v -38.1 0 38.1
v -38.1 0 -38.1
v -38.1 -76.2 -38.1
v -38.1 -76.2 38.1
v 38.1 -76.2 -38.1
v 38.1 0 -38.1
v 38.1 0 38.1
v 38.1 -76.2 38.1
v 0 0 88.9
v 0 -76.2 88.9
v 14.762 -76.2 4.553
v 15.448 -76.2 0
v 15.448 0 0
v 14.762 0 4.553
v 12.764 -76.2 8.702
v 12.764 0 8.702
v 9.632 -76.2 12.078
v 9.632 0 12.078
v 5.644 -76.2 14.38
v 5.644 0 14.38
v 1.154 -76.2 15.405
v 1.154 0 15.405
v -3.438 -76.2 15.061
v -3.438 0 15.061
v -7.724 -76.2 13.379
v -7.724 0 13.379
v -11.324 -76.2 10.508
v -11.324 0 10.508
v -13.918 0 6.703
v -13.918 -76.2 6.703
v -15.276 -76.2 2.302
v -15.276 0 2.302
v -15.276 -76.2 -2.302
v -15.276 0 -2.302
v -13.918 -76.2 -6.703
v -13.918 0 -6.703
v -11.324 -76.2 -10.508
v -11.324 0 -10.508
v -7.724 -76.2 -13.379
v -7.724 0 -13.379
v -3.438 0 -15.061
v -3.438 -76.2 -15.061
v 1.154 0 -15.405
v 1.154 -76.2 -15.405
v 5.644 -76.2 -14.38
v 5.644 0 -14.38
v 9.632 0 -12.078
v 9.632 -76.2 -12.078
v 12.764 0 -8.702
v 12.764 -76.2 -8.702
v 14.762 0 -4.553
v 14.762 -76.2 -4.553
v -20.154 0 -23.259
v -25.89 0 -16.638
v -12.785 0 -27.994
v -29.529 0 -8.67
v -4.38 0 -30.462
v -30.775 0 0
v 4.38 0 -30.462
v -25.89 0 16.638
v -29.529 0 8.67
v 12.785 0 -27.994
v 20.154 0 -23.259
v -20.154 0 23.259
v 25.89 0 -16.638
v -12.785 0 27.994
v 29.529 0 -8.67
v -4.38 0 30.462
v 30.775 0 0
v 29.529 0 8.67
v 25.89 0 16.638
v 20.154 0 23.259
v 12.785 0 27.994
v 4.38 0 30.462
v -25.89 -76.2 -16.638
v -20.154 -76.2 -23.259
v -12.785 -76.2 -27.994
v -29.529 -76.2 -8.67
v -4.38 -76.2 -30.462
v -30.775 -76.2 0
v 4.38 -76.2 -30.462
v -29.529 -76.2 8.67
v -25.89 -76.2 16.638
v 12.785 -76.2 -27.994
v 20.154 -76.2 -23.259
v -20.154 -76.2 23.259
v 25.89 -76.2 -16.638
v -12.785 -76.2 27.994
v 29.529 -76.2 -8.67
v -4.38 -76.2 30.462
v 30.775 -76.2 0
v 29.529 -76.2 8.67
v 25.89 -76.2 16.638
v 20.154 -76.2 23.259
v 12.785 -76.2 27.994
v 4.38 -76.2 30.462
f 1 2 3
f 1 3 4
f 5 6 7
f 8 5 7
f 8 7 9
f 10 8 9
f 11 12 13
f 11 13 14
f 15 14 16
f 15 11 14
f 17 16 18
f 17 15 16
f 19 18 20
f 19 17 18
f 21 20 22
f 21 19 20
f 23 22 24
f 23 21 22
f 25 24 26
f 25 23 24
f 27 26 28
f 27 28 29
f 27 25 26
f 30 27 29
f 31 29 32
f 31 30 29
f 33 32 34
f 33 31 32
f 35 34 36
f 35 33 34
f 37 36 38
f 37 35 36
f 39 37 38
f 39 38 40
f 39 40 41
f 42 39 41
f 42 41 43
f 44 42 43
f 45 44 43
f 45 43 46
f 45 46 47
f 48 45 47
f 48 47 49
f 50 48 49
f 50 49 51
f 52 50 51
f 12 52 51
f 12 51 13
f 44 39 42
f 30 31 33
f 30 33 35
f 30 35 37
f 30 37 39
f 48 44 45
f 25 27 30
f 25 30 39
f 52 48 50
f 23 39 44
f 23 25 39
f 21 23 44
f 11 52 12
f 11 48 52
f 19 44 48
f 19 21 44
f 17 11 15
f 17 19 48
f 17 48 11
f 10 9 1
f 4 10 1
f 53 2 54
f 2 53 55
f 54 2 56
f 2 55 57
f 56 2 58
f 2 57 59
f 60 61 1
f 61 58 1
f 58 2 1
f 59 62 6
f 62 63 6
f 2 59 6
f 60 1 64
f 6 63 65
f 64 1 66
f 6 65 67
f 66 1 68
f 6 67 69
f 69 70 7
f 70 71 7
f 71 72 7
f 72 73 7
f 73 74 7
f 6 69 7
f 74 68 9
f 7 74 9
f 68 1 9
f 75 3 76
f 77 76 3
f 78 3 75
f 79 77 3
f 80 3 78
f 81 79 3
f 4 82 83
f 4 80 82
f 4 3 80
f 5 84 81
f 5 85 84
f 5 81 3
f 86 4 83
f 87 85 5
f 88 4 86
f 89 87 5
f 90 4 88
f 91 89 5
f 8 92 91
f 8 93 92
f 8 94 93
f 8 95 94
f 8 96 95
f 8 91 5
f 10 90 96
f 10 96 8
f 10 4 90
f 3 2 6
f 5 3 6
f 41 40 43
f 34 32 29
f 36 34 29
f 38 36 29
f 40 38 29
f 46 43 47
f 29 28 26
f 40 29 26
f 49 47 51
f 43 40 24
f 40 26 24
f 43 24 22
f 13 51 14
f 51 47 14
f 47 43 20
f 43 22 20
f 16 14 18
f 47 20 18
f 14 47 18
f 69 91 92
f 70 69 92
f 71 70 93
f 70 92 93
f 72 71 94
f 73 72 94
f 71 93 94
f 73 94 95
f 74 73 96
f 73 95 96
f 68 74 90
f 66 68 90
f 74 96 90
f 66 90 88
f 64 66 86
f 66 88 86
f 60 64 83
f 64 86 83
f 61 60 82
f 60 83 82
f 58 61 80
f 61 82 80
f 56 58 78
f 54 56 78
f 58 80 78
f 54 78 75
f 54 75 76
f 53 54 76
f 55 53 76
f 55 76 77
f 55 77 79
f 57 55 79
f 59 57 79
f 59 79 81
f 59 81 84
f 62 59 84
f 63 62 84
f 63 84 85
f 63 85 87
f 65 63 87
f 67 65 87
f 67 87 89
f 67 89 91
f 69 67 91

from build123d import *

# Parameters (mm, degrees)
F0_W     = 76.2
F0_H     = 76.2
F1_DEPTH = 76.2
F2_R     = 30.775426
F2_R_2   = 15.448367
F3_DEPTH = 76.201


with BuildPart() as f1:
    # F0 (on Front) → F1 (new body)
    with BuildSketch(Plane.XZ):
        Polygon((0, 88.9), (-38.1, 38.1), (38.1, 38.1), align=None)
        Rectangle(F0_W, F0_H)
    extrude(amount=F1_DEPTH)

    # F2 (on face) → F3 (cut, through all)
    with BuildSketch(Plane.XZ.offset(76.2)):
        Circle(F2_R)
        Circle(F2_R_2, mode=Mode.SUBTRACT)
    extrude(amount=-F3_DEPTH, mode=Mode.SUBTRACT)


solid = f1.part
